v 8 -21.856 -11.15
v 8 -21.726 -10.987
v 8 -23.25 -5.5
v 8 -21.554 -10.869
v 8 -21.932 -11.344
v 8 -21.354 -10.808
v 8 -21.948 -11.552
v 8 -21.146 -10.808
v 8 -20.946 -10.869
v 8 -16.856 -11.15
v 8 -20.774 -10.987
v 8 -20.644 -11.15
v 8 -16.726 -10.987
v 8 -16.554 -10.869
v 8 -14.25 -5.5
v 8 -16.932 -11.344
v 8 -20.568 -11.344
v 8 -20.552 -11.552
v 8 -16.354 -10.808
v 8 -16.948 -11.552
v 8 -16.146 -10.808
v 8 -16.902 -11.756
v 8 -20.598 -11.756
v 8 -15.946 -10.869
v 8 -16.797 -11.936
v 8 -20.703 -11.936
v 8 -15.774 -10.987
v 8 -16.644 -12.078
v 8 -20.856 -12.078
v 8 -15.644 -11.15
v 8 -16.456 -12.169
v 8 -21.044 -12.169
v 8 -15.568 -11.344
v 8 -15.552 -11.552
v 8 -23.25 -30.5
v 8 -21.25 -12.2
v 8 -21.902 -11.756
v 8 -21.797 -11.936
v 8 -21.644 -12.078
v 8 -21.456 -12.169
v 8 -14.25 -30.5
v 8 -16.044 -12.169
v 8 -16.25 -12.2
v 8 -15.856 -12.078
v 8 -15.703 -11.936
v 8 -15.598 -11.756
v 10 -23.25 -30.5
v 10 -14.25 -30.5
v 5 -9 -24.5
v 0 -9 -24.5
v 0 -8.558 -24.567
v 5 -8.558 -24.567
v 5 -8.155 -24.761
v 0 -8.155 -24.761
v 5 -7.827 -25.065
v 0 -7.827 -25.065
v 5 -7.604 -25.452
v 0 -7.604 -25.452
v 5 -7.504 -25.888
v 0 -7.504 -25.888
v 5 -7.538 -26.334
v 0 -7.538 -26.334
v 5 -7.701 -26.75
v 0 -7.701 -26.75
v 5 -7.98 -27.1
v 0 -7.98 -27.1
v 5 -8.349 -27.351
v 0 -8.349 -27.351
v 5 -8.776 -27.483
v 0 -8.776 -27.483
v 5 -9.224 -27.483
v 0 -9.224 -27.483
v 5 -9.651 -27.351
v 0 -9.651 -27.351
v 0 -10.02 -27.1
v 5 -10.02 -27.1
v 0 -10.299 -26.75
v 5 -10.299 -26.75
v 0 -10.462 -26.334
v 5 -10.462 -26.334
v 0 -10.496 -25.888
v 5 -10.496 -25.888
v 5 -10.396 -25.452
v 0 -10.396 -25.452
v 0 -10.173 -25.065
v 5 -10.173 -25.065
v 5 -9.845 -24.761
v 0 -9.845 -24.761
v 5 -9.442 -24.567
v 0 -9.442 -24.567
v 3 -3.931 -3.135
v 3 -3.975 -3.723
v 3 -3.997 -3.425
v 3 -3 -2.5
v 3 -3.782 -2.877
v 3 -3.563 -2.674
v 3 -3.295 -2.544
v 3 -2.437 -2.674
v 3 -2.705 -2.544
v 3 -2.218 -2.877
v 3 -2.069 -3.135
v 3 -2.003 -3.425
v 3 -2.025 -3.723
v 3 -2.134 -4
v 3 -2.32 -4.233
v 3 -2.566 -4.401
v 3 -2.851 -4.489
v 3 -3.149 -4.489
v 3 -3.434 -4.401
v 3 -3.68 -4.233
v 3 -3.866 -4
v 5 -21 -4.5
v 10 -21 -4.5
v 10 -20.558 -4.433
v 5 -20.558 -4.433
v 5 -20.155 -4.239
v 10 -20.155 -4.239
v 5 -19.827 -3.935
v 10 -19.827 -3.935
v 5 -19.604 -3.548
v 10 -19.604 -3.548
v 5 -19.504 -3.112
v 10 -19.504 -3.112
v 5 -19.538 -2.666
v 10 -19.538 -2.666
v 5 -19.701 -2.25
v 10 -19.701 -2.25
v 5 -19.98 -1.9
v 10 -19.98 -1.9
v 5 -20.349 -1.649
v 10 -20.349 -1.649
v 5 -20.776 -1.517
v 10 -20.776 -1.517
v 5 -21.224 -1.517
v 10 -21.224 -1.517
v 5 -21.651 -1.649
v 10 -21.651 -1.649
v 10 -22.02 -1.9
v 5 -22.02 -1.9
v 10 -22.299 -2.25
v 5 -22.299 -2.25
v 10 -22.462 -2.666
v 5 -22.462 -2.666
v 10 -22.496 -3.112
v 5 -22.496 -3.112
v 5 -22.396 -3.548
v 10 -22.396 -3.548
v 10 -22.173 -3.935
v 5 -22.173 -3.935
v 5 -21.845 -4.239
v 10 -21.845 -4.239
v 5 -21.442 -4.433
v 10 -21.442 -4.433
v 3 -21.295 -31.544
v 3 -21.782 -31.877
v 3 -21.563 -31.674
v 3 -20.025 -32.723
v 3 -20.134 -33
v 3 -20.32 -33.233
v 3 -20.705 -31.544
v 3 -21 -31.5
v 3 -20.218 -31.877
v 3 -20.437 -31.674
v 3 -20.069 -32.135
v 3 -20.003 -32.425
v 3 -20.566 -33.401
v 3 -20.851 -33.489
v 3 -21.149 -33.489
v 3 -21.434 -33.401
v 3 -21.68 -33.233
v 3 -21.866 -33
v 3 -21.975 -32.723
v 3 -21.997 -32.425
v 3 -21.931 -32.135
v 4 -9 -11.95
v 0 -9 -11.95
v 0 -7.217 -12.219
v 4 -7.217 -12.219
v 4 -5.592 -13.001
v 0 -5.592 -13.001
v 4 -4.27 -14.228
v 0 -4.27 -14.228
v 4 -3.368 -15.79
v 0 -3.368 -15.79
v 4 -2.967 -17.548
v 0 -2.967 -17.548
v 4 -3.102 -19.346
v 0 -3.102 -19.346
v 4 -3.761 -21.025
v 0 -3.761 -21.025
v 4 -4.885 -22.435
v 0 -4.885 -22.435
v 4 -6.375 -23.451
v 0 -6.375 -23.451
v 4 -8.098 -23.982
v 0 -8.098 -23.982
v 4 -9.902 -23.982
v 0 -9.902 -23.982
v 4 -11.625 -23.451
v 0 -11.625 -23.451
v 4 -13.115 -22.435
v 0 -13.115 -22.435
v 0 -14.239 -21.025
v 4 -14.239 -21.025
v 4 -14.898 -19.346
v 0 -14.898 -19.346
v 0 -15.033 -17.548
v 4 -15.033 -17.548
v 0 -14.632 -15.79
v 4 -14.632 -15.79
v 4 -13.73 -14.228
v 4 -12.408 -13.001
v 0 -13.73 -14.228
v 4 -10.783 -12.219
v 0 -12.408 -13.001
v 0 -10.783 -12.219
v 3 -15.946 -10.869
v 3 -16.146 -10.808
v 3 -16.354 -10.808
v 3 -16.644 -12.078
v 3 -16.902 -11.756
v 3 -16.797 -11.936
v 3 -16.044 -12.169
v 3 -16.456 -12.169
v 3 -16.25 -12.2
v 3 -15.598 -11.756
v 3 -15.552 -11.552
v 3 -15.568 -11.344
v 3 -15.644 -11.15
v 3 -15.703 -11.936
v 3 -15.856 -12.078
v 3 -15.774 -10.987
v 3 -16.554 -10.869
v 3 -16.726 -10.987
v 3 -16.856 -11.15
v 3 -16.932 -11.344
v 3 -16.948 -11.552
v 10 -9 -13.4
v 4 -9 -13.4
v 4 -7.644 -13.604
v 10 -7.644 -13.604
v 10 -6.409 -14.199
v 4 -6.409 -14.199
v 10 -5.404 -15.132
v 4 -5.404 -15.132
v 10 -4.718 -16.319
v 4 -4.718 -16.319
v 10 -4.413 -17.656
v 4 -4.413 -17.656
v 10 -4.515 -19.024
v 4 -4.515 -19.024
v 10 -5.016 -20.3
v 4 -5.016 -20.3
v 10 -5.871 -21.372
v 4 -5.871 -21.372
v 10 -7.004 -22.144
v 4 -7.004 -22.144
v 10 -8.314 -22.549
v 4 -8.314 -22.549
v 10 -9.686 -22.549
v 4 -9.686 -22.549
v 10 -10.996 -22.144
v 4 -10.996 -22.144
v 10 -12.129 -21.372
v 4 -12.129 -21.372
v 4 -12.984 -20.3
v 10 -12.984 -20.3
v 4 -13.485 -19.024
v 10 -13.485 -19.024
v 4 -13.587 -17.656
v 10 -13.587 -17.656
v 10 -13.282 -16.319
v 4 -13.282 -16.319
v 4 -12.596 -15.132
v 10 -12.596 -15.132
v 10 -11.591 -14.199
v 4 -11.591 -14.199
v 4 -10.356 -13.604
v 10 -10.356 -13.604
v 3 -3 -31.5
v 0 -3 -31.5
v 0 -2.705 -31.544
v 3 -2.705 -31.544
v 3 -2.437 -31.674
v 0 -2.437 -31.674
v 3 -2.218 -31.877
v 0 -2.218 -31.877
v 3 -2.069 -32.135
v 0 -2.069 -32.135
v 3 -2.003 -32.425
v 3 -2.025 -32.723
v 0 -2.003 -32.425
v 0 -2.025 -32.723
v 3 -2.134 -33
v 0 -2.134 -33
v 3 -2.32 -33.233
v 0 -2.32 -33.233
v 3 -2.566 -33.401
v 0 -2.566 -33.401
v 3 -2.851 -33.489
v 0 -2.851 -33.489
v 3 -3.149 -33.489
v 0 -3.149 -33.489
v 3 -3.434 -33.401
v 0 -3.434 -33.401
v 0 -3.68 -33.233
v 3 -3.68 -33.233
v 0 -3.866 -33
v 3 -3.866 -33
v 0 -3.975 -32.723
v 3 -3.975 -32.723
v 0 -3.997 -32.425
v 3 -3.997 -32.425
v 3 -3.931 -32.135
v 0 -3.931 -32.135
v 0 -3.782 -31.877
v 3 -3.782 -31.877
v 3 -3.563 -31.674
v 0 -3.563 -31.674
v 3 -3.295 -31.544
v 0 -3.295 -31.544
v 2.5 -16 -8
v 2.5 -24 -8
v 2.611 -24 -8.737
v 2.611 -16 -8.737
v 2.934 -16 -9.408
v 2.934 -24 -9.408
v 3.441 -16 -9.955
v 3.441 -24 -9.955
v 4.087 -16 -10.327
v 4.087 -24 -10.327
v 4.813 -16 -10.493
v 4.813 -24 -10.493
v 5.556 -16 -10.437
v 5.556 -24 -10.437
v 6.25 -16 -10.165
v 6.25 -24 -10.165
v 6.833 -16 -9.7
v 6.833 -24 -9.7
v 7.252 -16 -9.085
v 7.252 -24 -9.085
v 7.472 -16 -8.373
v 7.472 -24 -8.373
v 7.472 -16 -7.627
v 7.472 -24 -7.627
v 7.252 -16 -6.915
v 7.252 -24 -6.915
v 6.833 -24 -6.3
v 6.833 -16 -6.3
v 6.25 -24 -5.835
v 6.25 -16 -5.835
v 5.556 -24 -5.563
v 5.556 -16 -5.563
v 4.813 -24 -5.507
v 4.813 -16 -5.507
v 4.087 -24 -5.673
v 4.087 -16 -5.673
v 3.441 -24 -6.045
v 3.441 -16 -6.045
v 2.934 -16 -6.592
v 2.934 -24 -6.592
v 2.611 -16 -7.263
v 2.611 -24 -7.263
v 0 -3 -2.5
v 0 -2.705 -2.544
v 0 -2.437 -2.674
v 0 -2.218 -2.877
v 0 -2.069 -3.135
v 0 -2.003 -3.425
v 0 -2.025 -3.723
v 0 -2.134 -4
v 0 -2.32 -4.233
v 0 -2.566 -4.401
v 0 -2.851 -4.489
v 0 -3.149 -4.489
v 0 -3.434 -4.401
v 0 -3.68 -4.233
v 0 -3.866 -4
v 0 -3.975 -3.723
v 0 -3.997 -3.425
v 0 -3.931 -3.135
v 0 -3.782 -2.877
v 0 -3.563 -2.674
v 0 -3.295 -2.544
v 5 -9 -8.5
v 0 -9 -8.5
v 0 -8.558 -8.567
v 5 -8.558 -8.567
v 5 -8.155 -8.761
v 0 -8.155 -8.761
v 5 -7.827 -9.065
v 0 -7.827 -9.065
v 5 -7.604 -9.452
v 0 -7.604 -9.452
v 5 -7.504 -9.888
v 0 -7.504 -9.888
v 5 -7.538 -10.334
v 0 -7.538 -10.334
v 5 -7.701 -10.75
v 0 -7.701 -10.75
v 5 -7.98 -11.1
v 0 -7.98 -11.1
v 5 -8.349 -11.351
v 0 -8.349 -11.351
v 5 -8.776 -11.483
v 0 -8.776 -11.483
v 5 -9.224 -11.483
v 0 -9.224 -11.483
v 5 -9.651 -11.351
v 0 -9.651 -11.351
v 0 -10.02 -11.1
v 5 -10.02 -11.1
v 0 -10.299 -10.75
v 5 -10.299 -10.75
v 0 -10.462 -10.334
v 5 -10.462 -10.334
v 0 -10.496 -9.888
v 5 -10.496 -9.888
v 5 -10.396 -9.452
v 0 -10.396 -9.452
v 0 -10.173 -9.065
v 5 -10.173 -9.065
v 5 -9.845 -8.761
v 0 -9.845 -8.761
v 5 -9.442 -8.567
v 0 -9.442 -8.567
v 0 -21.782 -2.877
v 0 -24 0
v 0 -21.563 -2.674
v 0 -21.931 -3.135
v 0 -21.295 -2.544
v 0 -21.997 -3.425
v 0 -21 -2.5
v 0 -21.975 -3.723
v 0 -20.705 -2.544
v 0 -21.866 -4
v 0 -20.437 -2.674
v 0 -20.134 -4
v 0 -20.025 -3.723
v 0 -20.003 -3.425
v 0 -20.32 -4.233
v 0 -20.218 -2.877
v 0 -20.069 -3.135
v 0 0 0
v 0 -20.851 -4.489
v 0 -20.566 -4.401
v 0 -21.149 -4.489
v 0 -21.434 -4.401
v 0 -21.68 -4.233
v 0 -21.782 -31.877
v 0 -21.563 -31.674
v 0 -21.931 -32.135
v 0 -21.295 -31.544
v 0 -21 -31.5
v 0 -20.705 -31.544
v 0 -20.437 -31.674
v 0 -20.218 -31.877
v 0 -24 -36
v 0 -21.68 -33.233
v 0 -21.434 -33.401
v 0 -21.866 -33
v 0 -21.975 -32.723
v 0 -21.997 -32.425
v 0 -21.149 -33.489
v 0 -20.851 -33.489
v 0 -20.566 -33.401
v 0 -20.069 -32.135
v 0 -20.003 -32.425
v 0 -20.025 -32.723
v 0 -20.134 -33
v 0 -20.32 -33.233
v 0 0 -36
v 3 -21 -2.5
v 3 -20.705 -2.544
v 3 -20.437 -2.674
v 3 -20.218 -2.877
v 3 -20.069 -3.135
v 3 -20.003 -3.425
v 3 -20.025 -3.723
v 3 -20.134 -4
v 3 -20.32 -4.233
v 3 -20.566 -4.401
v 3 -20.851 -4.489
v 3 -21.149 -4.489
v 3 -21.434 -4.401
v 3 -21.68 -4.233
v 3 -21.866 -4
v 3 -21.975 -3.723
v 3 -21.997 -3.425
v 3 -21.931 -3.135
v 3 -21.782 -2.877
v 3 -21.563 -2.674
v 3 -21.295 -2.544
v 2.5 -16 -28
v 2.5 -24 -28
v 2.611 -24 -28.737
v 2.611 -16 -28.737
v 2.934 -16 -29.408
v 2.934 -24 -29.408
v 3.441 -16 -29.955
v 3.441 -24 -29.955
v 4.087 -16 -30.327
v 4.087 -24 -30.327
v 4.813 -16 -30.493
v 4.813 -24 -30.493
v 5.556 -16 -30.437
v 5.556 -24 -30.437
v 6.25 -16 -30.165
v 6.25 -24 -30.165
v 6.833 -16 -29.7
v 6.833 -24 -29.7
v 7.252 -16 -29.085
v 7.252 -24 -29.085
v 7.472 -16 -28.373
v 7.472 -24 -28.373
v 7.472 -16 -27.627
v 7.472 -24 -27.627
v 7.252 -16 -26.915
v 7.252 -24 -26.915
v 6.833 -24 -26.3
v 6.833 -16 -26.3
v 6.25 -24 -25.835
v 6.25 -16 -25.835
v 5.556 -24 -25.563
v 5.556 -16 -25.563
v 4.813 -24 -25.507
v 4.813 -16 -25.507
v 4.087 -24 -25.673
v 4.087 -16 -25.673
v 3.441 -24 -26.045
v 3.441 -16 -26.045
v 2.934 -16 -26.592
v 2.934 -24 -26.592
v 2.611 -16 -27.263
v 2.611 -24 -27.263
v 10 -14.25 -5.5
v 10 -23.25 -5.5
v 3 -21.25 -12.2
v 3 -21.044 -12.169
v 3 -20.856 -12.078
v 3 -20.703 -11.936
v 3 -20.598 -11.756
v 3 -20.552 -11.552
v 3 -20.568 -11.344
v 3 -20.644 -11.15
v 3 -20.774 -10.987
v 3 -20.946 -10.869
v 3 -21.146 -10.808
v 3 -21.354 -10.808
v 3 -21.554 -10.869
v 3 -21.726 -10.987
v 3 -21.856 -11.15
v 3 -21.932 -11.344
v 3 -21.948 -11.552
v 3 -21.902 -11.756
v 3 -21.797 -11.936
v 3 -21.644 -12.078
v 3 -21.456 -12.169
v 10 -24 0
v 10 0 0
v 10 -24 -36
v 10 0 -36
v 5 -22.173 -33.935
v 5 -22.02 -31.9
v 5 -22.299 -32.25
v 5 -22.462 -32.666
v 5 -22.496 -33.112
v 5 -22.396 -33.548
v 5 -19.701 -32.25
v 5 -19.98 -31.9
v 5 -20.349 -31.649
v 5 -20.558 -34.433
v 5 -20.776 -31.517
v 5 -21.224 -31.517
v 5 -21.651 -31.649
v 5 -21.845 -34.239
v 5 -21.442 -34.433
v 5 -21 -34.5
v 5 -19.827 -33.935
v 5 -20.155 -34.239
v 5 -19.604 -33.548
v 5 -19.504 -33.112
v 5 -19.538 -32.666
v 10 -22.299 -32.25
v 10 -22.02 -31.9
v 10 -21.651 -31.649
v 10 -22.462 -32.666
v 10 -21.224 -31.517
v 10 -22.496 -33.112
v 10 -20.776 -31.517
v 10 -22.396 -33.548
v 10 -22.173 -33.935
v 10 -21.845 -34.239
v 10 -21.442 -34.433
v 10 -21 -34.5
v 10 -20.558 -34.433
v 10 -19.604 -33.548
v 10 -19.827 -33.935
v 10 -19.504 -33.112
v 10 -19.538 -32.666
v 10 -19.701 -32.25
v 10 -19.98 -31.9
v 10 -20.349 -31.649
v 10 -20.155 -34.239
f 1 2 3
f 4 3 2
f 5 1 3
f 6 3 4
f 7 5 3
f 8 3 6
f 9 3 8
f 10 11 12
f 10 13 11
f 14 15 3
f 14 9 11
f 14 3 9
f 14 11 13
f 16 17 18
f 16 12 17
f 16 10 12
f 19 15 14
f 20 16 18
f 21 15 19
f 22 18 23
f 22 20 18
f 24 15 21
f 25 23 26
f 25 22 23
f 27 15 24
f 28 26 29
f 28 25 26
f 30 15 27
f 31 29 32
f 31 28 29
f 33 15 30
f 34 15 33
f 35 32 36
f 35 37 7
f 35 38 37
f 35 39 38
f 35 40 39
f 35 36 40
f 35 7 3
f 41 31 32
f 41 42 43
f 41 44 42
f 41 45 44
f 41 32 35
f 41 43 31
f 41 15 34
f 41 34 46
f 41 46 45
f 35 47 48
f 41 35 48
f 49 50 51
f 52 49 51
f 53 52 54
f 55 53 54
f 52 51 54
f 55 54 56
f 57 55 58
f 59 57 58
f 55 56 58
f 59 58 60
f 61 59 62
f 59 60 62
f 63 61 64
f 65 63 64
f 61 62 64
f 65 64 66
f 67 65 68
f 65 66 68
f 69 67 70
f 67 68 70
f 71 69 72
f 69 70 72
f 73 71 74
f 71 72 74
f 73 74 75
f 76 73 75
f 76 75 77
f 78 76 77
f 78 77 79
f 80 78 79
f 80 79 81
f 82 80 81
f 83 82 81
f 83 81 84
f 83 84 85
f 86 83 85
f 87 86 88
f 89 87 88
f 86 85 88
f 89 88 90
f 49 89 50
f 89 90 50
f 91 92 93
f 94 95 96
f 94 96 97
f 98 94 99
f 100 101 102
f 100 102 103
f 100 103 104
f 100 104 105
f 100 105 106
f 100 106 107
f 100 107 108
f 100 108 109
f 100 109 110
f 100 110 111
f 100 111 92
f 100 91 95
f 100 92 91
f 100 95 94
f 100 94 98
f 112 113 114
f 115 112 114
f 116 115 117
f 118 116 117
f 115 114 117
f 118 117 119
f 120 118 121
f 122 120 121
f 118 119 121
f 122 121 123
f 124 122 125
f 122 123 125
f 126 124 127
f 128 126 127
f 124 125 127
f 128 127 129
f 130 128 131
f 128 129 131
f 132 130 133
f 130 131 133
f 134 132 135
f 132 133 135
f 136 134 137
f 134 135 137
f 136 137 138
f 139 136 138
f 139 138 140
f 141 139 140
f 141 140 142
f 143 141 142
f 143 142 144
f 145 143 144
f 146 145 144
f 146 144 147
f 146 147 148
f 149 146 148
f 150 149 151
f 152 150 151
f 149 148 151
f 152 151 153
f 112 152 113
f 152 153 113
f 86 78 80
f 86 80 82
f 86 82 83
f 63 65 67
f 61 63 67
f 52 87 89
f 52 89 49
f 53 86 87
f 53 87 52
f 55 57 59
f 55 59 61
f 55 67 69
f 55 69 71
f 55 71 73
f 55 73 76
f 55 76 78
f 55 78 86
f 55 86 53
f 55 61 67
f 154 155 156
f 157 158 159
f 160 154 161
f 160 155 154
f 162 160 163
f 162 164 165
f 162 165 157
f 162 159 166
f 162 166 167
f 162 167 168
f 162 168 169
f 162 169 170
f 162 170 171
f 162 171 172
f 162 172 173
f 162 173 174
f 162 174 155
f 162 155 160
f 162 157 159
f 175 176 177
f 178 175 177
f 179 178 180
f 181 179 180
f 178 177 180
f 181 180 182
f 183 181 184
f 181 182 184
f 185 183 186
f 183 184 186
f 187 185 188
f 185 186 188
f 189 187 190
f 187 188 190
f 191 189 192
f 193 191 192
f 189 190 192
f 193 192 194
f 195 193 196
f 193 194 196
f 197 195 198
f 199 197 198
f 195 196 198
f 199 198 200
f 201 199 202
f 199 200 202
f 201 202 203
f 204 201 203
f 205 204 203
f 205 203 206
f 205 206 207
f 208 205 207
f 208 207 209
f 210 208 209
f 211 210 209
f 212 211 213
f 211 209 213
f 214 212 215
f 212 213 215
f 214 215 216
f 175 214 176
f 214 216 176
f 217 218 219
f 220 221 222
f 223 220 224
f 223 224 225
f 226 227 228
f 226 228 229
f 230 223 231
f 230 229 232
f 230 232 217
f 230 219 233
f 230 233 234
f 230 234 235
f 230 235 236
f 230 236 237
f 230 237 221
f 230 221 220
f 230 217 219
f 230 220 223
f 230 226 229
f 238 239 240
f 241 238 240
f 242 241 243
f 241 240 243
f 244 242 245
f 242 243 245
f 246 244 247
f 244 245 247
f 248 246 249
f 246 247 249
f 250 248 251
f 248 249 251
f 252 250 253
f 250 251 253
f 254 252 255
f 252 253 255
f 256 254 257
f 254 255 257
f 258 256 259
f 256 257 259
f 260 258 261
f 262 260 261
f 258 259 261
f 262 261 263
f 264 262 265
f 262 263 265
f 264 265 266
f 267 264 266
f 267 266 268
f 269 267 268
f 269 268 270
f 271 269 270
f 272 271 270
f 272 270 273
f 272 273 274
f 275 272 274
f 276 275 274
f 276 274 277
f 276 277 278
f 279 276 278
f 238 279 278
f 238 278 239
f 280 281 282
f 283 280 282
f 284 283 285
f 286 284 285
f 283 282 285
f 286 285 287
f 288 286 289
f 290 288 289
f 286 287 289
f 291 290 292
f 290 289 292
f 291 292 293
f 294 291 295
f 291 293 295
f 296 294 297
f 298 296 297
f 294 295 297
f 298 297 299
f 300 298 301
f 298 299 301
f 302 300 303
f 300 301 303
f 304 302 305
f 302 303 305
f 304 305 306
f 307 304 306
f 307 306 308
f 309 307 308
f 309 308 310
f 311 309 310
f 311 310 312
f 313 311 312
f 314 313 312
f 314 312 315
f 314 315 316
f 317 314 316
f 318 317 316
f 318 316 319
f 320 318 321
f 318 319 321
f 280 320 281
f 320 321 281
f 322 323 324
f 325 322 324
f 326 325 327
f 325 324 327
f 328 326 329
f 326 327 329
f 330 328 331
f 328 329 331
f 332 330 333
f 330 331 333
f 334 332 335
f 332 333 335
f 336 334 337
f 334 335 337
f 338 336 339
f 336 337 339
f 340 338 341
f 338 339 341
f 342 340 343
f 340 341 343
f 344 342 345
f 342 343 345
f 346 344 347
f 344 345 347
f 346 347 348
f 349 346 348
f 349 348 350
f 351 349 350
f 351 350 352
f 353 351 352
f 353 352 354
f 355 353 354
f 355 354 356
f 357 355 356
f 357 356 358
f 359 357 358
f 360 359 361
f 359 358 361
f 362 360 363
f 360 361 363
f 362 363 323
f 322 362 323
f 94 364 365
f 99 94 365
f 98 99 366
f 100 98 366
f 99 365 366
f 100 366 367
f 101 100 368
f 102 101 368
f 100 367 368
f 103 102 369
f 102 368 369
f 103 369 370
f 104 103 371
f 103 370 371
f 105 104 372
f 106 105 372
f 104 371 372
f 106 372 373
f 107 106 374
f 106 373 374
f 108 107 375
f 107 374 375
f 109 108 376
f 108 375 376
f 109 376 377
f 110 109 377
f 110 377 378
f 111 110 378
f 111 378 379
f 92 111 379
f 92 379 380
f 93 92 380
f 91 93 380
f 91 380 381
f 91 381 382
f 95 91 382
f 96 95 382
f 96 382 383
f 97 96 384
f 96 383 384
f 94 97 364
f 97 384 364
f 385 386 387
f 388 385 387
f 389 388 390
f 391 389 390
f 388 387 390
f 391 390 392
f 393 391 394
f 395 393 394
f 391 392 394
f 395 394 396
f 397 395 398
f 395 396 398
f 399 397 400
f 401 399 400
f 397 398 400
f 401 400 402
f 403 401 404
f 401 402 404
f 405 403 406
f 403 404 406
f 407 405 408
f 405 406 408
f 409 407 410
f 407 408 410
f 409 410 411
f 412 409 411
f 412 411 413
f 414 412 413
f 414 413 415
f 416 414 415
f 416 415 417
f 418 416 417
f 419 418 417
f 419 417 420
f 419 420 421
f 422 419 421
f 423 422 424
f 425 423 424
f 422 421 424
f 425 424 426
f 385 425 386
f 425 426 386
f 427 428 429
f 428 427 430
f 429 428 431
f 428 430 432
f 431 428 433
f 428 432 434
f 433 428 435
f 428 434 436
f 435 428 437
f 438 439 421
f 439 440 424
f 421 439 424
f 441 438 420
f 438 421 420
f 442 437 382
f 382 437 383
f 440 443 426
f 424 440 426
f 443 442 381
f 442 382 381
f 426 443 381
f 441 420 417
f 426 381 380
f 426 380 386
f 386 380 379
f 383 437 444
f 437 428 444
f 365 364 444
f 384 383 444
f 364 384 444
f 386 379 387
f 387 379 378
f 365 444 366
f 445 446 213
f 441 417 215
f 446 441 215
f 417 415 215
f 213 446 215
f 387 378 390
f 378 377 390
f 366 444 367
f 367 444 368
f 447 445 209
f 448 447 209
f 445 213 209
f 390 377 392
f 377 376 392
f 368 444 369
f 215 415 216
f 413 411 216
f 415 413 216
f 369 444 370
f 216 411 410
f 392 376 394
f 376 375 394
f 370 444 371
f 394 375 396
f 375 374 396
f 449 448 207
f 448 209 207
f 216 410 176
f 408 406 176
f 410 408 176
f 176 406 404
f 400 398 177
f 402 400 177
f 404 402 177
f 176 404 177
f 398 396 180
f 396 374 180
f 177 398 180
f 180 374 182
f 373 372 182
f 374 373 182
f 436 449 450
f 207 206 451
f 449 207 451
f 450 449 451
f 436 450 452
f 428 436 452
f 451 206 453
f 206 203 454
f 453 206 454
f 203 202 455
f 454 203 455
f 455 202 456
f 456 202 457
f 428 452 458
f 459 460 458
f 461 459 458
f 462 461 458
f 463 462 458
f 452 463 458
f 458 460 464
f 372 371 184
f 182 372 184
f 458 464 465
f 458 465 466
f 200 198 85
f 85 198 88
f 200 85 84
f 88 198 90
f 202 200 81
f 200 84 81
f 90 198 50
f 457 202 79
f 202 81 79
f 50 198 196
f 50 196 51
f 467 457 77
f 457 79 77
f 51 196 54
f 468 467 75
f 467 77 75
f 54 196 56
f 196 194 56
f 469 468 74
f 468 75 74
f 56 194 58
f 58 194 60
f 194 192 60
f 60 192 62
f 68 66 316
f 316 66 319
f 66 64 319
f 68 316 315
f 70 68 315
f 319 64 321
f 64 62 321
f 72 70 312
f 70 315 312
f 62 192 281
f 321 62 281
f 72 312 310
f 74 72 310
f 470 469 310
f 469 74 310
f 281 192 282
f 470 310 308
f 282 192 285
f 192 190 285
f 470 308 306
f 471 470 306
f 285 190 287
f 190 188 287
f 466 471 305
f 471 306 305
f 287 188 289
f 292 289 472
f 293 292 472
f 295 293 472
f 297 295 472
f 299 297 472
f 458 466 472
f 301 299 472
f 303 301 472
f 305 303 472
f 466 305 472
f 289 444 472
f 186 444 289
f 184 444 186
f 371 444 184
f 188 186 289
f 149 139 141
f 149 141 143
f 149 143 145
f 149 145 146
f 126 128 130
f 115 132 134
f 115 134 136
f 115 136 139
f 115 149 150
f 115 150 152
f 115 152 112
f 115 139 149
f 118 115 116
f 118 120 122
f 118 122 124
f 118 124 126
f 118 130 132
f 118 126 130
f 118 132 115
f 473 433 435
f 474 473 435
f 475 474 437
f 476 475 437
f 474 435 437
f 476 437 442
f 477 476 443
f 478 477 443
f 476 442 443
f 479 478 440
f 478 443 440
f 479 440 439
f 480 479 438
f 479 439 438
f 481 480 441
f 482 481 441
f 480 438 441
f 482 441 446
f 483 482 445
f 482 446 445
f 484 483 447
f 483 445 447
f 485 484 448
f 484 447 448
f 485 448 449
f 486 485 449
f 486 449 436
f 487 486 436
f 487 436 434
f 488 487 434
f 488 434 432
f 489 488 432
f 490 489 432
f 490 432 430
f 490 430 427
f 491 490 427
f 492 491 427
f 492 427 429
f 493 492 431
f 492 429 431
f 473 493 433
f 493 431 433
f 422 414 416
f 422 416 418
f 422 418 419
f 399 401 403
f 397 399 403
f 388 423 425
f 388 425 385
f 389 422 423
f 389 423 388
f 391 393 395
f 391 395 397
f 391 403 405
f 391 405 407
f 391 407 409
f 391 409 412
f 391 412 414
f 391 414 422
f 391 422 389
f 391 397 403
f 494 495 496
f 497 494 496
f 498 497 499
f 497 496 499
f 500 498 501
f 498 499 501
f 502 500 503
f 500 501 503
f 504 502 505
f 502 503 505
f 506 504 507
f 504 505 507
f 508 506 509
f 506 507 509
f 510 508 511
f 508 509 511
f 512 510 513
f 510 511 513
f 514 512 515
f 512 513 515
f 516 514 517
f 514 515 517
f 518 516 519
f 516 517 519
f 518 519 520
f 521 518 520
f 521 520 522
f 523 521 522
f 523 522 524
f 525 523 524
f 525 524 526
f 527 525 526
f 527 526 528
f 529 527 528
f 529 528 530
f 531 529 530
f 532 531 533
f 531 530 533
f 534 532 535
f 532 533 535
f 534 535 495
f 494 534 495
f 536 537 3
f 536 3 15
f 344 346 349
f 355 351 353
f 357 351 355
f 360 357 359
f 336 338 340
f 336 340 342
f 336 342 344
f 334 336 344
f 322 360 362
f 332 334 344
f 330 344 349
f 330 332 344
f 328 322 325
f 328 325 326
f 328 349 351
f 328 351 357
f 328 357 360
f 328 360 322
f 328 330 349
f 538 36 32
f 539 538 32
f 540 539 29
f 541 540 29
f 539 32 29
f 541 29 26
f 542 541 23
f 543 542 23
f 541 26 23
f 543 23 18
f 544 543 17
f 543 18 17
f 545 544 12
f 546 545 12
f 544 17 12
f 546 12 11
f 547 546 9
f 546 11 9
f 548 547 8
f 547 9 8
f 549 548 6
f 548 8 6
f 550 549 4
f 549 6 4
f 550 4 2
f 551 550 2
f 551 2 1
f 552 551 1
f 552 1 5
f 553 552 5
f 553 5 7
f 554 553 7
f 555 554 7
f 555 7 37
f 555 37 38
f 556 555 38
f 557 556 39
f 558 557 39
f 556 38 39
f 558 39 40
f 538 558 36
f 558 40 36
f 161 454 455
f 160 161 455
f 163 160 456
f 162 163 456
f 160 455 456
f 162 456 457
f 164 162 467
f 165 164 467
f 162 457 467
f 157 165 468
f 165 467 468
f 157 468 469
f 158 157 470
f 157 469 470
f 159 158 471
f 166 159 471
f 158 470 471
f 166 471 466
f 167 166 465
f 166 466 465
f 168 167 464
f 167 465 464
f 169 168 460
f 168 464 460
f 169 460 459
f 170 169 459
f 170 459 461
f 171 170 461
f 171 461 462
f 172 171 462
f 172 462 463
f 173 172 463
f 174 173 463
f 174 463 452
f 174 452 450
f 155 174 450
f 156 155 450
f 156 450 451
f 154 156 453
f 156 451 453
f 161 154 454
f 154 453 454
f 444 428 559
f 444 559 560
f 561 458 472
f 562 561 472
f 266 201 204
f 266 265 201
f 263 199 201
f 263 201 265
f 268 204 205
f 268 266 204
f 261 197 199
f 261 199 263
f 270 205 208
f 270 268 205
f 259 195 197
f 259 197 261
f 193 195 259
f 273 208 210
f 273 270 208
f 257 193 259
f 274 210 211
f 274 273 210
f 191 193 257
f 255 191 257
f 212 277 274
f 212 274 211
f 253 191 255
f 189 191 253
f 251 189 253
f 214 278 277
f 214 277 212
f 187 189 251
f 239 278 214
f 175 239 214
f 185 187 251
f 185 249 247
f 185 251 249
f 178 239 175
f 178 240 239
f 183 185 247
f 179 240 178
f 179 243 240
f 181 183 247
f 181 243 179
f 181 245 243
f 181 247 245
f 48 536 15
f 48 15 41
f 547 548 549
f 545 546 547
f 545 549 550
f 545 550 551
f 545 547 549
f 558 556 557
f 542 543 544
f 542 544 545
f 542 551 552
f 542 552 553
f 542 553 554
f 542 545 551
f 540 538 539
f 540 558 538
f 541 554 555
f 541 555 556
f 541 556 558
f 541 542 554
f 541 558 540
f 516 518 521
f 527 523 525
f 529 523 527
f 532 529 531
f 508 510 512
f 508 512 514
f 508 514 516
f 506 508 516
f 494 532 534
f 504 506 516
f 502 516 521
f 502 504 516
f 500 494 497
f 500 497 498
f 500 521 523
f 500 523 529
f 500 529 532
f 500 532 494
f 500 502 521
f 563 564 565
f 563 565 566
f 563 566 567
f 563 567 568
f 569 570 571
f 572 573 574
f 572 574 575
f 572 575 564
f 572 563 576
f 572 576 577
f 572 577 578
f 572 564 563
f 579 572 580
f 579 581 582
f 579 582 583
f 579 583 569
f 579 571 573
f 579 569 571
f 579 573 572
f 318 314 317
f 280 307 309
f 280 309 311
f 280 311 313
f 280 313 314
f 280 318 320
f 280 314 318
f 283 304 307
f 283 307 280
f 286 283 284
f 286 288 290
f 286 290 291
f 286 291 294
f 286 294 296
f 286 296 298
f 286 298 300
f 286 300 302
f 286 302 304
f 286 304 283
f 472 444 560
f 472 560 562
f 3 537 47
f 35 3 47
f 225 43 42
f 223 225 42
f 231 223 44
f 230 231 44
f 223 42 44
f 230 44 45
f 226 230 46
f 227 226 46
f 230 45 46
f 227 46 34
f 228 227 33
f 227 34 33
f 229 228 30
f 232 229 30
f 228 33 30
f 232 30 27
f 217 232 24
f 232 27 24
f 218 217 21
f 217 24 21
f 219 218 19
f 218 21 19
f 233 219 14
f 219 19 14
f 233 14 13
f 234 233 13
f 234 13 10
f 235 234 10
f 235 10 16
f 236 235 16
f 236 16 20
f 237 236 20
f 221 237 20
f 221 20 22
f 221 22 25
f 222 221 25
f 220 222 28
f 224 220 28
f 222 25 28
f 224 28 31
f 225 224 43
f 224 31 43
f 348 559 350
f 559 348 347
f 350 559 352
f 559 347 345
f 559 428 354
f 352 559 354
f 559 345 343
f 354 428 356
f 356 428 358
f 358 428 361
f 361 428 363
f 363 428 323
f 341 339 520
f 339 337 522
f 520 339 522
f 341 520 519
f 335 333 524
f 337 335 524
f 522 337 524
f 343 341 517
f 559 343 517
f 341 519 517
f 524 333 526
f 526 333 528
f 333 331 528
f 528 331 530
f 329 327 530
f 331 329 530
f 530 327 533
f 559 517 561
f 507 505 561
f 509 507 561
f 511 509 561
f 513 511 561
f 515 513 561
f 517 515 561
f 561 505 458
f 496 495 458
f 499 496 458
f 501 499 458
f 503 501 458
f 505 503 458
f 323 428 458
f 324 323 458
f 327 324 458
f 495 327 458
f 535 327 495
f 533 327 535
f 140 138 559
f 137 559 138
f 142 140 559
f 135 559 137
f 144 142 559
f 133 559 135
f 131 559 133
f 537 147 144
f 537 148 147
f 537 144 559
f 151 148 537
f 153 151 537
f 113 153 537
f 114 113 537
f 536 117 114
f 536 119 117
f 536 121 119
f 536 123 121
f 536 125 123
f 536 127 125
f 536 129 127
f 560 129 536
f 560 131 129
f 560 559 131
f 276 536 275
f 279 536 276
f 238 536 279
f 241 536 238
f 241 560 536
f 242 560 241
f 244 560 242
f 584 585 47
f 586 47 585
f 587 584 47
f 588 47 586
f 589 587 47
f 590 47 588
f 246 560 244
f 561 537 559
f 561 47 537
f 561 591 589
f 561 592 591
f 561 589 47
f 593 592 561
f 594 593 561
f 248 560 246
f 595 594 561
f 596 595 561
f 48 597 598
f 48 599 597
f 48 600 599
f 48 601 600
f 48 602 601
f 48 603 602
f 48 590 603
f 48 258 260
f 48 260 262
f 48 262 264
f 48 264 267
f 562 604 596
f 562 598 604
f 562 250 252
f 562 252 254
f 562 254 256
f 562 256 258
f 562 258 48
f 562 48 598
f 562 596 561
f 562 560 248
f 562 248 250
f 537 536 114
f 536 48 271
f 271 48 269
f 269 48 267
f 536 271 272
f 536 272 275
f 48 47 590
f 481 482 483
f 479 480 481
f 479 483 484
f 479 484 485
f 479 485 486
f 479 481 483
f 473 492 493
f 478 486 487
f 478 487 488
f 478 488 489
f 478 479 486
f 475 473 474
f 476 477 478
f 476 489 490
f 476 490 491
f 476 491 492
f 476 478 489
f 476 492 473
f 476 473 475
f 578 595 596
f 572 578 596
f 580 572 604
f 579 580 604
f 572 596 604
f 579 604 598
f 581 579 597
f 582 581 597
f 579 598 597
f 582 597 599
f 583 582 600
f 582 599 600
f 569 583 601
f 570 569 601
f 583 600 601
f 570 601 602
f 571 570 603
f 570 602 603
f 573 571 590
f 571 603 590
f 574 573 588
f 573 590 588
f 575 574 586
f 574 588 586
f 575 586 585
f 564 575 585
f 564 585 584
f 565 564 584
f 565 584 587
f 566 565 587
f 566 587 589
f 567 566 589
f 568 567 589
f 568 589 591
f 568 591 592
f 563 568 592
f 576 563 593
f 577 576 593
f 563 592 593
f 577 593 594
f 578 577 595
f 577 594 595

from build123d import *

# Parameters (mm, degrees)
SKETCH_1_W           = 36
SKETCH_1_H           = 24
EXTRUDE_1_DEPTH      = 10
SKETCH_2_R           = 6.05
CUT_EXTRUDE_1_DEPTH  = 4
SKETCH_3_R           = 4.6
CUT_EXTRUDE_2_DEPTH  = 7
SKETCH_5_R           = 2.5
CUT_EXTRUDE_4_DEPTH  = 8
SKETCH_7_W           = 25
SKETCH_7_H           = 9
CUT_EXTRUDE_5_DEPTH  = 2
SKETCH_8_R           = 1.5
CUT_EXTRUDE_6_DEPTH  = 5
SKETCH_9_R           = 1.5
CUT_EXTRUDE_7_DEPTH  = 5
SKETCH_11_R          = 1
CUT_EXTRUDE_9_DEPTH  = 3
SKETCH_13_R          = 0.7
CUT_EXTRUDE_10_DEPTH = 5


with BuildPart() as part:
    # 草图1 → 凸台-拉伸1 (new body)
    with BuildSketch(Plane(origin=(0, 0, 0), x_dir=(0, 0, -1), z_dir=(1, 0, 0))):
        with Locations((18, -12)):
            Rectangle(SKETCH_1_W, SKETCH_1_H)
    extrude(amount=EXTRUDE_1_DEPTH)

    # 草图2 → 切除-拉伸1 (cut)
    with BuildSketch(Plane.ZY):
        with Locations((-18, -9)):
            Circle(SKETCH_2_R)
    extrude(amount=-CUT_EXTRUDE_1_DEPTH, mode=Mode.SUBTRACT)

    # 草图3 → 切除-拉伸2 (cut, through all)
    with BuildSketch(Plane.ZY.offset(-4)):
        with Locations((-18, -9)):
            Circle(SKETCH_3_R)
    extrude(amount=-CUT_EXTRUDE_2_DEPTH, mode=Mode.SUBTRACT)

    # 草图5 → 切除-拉伸4 (cut)
    with BuildSketch(Plane(origin=(0, -24, 0), x_dir=(-1, 0, 0), z_dir=(0, -1, 0))):
        with Locations((-5, 28)):
            Circle(SKETCH_5_R)
        with Locations((-5, 8)):
            Circle(SKETCH_5_R)
    extrude(amount=-CUT_EXTRUDE_4_DEPTH, mode=Mode.SUBTRACT)

    # 草图7 → 切除-拉伸5 (cut)
    with BuildSketch(Plane(origin=(10, 0, 0), x_dir=(0, 0, -1), z_dir=(1, 0, 0))):
        with Locations((18, -18.75)):
            Rectangle(SKETCH_7_W, SKETCH_7_H)
    extrude(amount=-CUT_EXTRUDE_5_DEPTH, mode=Mode.SUBTRACT)

    # 草图8 → 切除-拉伸6 (cut)
    with BuildSketch(Plane.ZY):
        with Locations((-10, -9)):
            Circle(SKETCH_8_R)
        with Locations((-26, -9)):
            Circle(SKETCH_8_R)
    extrude(amount=-CUT_EXTRUDE_6_DEPTH, mode=Mode.SUBTRACT)

    # 草图9 → 切除-拉伸7 (cut)
    with BuildSketch(Plane(origin=(10, 0, 0), x_dir=(0, 0, -1), z_dir=(1, 0, 0))):
        with Locations((3, -21)):
            Circle(SKETCH_9_R)
        with Locations((33, -21)):
            Circle(SKETCH_9_R)
    extrude(amount=-CUT_EXTRUDE_7_DEPTH, mode=Mode.SUBTRACT)

    # 草图11 → 切除-拉伸9 (cut)
    with BuildSketch(Plane.ZY):
        with Locations((-32.5, -3)):
            Circle(SKETCH_11_R)
        with Locations((-32.5, -21)):
            Circle(SKETCH_11_R)
        with Locations((-3.5, -21)):
            Circle(SKETCH_11_R)
        with Locations((-3.5, -3)):
            Circle(SKETCH_11_R)
    extrude(amount=-CUT_EXTRUDE_9_DEPTH, mode=Mode.SUBTRACT)

    # 草图13 → 切除-拉伸10 (cut)
    with BuildSketch(Plane(origin=(8, 0, 0), x_dir=(0, 0, -1), z_dir=(1, 0, 0))):
        with Locations((11.5, -16.25)):
            Circle(SKETCH_13_R)
        with Locations((11.5, -21.25)):
            Circle(SKETCH_13_R)
    extrude(amount=-CUT_EXTRUDE_10_DEPTH, mode=Mode.SUBTRACT)


solid = part.part
